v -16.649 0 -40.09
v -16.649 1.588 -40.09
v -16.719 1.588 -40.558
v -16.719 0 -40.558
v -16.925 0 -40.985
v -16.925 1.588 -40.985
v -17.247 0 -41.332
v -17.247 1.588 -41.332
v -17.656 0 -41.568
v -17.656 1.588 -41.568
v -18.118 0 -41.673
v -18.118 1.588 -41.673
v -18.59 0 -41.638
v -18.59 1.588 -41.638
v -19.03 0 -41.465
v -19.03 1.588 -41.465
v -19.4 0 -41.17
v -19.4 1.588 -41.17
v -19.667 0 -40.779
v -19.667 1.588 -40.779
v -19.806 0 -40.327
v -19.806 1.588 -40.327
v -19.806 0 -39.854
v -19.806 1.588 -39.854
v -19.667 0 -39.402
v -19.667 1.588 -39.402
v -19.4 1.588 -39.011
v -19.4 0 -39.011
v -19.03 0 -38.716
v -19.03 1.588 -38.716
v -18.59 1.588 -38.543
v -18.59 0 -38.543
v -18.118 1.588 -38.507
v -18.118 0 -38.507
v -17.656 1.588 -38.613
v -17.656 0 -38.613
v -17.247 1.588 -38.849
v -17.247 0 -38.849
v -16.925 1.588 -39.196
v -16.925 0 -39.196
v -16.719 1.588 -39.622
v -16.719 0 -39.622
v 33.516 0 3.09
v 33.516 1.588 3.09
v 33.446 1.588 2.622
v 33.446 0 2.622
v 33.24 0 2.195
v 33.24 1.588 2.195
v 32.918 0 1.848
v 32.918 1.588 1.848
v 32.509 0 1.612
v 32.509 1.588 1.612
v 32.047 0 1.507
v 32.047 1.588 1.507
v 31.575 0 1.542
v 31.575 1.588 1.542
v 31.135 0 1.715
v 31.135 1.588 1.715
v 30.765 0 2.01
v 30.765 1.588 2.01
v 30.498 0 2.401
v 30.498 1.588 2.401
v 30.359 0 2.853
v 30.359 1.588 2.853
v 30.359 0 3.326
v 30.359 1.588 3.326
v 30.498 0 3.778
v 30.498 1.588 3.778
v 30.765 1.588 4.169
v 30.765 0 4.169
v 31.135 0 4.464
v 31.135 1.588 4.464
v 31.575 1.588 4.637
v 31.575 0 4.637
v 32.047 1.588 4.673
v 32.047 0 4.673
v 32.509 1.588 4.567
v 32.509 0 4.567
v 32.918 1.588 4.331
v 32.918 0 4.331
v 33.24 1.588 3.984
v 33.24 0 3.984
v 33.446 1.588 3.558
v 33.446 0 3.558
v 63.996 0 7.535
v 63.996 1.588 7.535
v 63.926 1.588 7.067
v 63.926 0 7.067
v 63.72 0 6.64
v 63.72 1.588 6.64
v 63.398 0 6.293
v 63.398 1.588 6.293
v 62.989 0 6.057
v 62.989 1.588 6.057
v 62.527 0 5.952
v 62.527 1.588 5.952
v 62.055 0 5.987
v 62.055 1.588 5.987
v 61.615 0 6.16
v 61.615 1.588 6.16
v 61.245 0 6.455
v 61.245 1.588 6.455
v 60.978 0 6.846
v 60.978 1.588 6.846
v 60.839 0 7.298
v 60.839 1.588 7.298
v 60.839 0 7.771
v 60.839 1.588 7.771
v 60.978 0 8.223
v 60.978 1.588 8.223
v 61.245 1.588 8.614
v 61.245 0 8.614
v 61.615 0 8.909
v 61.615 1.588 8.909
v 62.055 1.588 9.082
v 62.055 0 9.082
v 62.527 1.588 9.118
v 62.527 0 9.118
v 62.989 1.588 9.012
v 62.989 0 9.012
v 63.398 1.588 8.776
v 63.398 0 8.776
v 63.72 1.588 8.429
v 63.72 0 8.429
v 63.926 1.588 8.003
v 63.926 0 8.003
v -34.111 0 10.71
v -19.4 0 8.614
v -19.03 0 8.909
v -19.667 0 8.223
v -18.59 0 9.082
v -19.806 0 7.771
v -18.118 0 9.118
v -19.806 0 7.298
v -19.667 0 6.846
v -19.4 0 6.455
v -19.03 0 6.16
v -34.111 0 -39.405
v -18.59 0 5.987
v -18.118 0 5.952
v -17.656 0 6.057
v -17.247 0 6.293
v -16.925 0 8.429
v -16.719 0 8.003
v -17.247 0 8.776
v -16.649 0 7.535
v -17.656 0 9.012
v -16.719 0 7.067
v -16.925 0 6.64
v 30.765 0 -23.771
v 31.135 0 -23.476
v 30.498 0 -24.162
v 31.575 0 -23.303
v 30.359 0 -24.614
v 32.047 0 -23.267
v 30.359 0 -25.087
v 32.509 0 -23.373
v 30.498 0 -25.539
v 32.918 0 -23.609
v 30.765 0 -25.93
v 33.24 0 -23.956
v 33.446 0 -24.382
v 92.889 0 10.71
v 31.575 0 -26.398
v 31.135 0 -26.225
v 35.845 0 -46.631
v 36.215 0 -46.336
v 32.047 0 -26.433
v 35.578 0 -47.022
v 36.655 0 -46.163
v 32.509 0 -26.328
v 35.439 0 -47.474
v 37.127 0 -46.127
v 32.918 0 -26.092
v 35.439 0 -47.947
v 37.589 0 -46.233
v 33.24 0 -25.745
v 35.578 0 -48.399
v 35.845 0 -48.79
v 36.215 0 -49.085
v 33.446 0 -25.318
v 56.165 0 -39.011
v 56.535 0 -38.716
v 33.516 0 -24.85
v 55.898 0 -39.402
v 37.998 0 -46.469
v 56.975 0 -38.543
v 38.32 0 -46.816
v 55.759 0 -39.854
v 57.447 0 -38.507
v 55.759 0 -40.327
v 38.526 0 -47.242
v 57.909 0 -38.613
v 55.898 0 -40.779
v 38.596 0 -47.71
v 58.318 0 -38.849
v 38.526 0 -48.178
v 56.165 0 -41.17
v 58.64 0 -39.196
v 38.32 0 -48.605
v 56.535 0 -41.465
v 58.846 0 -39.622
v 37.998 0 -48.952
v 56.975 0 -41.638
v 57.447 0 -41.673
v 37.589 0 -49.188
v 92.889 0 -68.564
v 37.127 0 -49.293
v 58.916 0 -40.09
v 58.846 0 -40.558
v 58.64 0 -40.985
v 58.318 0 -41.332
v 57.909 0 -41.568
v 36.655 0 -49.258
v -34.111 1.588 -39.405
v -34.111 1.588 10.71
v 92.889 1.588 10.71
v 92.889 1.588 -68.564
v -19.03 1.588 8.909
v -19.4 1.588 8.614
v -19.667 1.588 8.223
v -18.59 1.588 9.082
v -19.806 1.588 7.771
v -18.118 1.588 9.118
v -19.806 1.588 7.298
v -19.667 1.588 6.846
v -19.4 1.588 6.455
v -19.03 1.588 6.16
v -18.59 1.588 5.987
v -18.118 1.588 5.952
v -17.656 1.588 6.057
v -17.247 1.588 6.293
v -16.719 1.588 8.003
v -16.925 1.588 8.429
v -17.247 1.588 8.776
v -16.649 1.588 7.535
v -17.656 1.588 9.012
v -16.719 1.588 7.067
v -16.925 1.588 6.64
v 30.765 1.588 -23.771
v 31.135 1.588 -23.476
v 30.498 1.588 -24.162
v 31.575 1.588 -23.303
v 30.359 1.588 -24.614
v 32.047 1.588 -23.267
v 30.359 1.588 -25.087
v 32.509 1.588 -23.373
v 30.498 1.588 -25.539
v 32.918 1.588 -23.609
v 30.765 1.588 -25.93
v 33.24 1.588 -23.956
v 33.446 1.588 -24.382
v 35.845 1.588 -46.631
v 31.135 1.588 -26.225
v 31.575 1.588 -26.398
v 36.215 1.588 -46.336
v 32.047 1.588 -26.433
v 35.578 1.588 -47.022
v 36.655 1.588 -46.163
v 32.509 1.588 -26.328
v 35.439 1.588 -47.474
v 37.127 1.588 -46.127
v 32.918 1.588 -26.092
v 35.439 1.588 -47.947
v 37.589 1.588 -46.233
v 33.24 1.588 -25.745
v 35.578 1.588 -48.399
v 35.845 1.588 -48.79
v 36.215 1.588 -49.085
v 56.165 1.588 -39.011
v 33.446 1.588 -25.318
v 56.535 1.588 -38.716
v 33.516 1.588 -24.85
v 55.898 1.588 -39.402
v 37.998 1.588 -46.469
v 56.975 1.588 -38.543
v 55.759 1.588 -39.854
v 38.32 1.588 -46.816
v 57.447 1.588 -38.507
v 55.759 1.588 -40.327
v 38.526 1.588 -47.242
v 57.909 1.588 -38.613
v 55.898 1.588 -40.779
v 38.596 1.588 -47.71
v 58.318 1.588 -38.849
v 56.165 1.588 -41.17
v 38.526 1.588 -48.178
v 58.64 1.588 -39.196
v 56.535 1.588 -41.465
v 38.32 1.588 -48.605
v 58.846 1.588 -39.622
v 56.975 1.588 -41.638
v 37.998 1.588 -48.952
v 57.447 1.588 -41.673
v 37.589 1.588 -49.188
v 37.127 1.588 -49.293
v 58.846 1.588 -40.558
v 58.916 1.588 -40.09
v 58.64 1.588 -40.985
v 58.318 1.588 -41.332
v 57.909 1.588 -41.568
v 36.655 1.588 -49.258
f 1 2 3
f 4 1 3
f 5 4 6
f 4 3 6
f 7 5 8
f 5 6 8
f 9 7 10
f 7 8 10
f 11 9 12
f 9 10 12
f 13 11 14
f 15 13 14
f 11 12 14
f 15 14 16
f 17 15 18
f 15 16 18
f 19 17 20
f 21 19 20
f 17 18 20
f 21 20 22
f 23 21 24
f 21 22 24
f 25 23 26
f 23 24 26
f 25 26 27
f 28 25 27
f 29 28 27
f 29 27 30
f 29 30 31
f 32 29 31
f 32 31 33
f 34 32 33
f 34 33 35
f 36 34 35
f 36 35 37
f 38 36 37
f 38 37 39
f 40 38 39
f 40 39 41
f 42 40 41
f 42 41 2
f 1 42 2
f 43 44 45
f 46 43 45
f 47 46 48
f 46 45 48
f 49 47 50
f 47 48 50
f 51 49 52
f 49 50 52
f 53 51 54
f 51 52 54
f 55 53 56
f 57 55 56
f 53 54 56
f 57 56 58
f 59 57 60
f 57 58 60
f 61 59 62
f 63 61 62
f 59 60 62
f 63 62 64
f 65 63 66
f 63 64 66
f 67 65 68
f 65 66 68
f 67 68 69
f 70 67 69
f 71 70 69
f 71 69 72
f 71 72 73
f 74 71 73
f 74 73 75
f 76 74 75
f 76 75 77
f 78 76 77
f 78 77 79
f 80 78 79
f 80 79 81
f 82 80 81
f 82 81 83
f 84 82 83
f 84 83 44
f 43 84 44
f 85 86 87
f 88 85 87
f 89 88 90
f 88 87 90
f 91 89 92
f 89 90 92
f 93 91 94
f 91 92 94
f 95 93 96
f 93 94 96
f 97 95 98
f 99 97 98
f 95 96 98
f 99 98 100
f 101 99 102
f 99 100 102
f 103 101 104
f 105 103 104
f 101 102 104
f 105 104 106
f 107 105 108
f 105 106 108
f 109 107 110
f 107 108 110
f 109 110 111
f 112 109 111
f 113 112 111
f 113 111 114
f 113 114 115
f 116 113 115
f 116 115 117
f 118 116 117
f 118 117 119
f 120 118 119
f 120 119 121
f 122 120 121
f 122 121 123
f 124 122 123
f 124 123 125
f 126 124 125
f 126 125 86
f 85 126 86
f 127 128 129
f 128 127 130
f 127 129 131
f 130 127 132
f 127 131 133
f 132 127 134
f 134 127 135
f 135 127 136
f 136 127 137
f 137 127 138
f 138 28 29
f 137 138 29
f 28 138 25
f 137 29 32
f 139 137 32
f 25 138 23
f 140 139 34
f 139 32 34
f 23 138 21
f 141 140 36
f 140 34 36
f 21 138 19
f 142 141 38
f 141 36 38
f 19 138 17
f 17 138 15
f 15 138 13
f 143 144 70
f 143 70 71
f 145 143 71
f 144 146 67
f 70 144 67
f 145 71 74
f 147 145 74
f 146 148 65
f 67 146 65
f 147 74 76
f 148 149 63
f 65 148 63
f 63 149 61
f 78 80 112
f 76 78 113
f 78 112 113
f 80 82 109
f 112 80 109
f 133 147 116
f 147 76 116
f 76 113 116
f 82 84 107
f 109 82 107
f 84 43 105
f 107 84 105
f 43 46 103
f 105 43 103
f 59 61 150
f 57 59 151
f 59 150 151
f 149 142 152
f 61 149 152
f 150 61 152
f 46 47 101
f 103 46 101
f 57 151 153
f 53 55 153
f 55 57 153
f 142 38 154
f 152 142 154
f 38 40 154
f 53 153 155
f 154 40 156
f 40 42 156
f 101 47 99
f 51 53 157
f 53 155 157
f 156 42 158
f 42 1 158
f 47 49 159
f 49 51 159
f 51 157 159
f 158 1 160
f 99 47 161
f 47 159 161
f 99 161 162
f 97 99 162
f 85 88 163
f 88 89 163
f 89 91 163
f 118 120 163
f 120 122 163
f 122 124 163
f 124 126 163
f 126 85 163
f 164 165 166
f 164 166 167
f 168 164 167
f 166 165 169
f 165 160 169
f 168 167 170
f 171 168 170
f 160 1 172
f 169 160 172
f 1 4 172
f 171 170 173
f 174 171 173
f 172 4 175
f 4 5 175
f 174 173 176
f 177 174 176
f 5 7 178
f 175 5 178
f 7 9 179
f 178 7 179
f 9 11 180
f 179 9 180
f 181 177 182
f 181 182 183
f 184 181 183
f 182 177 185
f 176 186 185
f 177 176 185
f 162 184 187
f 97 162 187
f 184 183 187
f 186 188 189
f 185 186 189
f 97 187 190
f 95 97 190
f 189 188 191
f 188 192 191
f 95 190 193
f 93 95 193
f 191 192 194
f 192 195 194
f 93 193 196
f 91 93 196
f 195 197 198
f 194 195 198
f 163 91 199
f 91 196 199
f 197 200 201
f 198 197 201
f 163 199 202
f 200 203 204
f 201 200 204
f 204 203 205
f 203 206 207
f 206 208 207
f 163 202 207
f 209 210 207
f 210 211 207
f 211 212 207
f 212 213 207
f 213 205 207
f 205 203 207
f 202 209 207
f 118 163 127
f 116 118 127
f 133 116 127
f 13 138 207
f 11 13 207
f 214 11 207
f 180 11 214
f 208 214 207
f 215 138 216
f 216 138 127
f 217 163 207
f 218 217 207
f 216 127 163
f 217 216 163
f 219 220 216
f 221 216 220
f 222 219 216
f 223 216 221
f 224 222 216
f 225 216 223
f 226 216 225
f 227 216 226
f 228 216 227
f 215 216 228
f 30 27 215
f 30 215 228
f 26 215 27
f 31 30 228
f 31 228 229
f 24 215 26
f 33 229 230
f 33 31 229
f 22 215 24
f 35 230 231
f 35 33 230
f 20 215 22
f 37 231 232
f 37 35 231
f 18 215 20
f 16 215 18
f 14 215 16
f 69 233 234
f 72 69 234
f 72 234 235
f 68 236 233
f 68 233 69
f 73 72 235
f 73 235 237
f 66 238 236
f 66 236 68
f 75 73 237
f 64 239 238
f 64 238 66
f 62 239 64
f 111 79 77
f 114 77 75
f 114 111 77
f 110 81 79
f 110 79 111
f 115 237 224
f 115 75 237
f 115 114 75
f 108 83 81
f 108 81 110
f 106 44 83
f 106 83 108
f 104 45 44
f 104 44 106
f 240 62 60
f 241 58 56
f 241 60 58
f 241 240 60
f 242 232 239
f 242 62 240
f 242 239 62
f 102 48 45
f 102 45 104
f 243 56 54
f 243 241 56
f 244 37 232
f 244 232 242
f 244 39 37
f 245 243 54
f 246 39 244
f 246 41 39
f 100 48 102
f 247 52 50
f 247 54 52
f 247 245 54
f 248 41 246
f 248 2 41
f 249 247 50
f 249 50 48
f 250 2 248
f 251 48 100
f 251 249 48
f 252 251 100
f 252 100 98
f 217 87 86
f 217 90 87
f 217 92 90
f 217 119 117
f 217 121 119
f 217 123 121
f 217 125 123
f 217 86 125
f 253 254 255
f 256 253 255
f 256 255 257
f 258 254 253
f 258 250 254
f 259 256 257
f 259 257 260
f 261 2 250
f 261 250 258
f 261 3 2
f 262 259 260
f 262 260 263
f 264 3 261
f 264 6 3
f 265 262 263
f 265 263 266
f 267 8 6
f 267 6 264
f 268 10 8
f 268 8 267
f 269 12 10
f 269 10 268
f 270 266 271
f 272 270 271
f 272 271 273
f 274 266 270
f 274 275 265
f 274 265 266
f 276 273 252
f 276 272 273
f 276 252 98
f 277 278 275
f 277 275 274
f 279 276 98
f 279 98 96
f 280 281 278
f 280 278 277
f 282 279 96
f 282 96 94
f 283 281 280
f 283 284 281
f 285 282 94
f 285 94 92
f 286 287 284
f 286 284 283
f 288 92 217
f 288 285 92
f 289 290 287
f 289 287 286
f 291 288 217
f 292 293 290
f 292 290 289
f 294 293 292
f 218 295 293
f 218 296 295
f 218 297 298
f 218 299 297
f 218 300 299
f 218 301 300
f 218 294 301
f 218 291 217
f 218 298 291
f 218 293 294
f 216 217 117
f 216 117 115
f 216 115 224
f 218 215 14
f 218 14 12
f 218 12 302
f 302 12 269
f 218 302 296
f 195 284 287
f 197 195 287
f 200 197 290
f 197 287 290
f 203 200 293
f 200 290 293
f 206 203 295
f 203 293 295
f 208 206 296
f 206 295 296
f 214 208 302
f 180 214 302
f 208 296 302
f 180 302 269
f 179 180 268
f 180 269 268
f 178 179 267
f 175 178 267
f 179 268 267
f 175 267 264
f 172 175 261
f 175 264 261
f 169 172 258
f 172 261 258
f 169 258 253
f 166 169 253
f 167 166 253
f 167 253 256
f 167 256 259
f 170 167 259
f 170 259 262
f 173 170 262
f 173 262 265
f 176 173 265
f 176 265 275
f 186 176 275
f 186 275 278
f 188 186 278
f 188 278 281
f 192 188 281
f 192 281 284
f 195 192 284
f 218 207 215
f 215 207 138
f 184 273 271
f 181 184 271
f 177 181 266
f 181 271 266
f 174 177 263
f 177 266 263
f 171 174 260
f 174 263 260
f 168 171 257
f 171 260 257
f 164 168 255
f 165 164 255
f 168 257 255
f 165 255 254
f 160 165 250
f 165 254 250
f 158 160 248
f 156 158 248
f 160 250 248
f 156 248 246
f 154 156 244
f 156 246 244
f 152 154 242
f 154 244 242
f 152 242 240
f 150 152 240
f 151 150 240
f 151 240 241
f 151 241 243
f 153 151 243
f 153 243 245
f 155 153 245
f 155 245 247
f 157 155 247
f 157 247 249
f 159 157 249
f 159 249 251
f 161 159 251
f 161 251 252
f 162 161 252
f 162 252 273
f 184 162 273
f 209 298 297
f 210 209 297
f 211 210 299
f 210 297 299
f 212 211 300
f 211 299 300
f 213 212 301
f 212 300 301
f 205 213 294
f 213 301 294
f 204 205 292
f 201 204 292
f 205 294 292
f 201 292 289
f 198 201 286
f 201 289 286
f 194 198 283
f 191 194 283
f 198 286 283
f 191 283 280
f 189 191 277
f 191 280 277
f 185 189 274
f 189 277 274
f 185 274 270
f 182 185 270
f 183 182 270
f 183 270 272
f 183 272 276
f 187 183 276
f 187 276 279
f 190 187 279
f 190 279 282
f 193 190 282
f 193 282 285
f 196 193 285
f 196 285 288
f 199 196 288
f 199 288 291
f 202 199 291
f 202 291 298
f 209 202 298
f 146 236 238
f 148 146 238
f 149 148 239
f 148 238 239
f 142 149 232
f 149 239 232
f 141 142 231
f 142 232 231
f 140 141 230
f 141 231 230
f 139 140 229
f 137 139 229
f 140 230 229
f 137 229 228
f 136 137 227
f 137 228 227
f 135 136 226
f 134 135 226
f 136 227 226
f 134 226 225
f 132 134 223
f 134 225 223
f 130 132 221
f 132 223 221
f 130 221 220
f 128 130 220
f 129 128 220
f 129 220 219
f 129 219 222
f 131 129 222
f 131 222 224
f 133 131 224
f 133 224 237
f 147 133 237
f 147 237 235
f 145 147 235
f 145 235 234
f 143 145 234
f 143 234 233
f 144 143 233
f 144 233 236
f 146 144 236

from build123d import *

# Parameters (mm, degrees)
BOSS_EXTRUDE1_DEPTH = 1.5875
SKETCH2_R           = 1.5875
CUT_EXTRUDE1_DEPTH  = 2.5875


with BuildPart() as part:
    # Sketch1 → Boss-Extrude1 (new body)
    with BuildSketch(Plane(origin=(0, 0, 0), x_dir=(1, 0, 0), z_dir=(0, 1, 0))):
        Polygon((-34.11142792, 39.404580528), (-34.11142792, -10.709619472), (92.88857208, -10.709619472), (92.88857208, 68.563780528), align=None)
    extrude(amount=BOSS_EXTRUDE1_DEPTH)

    # Sketch2 → Cut-Extrude1 (cut, through all)
    with BuildSketch(Plane(origin=(0, 1.5875, 0), x_dir=(1, 0, 0), z_dir=(0, 1, 0))):
        with Locations((-18.23642792, 40.090380528)):
            Circle(SKETCH2_R)
        with Locations((-18.23642792, -7.534619472)):
            Circle(SKETCH2_R)
        with Locations((37.00857208, 47.710380528)):
            Circle(SKETCH2_R)
        with Locations((31.92857208, -3.089619472)):
            Circle(SKETCH2_R)
        with Locations((31.92857208, 24.850380528)):
            Circle(SKETCH2_R)
        with Locations((57.32857208, 40.090380528)):
            Circle(SKETCH2_R)
        with Locations((62.40857208, -7.534619472)):
            Circle(SKETCH2_R)
    extrude(amount=-CUT_EXTRUDE1_DEPTH, mode=Mode.SUBTRACT)


solid = part.part
